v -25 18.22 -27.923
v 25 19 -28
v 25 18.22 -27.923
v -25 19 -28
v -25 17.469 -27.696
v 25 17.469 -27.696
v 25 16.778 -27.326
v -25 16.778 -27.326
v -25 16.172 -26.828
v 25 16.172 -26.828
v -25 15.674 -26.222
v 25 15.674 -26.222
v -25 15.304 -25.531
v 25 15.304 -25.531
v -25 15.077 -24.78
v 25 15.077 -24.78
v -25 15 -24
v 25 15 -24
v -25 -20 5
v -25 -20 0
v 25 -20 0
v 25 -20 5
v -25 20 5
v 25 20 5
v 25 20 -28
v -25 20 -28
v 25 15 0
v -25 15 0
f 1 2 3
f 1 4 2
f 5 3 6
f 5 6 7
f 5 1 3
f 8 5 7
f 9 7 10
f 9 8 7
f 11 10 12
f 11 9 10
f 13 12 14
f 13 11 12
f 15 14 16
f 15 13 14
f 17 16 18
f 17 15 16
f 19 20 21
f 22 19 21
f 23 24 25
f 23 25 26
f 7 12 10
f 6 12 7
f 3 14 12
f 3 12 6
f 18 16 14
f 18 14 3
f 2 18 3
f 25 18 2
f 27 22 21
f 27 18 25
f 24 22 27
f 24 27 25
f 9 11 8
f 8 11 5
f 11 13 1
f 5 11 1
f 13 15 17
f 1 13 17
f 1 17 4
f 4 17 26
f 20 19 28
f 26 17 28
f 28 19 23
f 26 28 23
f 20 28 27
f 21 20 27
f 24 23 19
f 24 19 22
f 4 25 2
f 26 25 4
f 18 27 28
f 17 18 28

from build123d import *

# Parameters (mm, degrees)
SKETCH1_W           = 50
SKETCH1_H           = 40
BOSS_EXTRUDE1_DEPTH = 5
SKETCH2_W           = 50
SKETCH2_H           = 5
BOSS_EXTRUDE2_DEPTH = 28
FILLET1_R           = 4


with BuildPart() as part:
    # Sketch1 → Boss-Extrude1 (new body)
    with BuildSketch(Plane.XY):
        Rectangle(SKETCH1_W, SKETCH1_H)
    extrude(amount=BOSS_EXTRUDE1_DEPTH)

    # Sketch2 → Boss-Extrude2 (add)
    with BuildSketch(Plane(origin=(0, 0, 0), x_dir=(-1, 0, 0), z_dir=(0, 0, -1))):
        with Locations((0, 17.5)):
            Rectangle(SKETCH2_W, SKETCH2_H)
    extrude(amount=BOSS_EXTRUDE2_DEPTH)

    # Fillet1
    fillet1_edges = [part.edges().sort_by_distance(p)[0] for p in [
        (0, 15, -28),
    ]]
    fillet(fillet1_edges, radius=FILLET1_R)


solid = part.part
